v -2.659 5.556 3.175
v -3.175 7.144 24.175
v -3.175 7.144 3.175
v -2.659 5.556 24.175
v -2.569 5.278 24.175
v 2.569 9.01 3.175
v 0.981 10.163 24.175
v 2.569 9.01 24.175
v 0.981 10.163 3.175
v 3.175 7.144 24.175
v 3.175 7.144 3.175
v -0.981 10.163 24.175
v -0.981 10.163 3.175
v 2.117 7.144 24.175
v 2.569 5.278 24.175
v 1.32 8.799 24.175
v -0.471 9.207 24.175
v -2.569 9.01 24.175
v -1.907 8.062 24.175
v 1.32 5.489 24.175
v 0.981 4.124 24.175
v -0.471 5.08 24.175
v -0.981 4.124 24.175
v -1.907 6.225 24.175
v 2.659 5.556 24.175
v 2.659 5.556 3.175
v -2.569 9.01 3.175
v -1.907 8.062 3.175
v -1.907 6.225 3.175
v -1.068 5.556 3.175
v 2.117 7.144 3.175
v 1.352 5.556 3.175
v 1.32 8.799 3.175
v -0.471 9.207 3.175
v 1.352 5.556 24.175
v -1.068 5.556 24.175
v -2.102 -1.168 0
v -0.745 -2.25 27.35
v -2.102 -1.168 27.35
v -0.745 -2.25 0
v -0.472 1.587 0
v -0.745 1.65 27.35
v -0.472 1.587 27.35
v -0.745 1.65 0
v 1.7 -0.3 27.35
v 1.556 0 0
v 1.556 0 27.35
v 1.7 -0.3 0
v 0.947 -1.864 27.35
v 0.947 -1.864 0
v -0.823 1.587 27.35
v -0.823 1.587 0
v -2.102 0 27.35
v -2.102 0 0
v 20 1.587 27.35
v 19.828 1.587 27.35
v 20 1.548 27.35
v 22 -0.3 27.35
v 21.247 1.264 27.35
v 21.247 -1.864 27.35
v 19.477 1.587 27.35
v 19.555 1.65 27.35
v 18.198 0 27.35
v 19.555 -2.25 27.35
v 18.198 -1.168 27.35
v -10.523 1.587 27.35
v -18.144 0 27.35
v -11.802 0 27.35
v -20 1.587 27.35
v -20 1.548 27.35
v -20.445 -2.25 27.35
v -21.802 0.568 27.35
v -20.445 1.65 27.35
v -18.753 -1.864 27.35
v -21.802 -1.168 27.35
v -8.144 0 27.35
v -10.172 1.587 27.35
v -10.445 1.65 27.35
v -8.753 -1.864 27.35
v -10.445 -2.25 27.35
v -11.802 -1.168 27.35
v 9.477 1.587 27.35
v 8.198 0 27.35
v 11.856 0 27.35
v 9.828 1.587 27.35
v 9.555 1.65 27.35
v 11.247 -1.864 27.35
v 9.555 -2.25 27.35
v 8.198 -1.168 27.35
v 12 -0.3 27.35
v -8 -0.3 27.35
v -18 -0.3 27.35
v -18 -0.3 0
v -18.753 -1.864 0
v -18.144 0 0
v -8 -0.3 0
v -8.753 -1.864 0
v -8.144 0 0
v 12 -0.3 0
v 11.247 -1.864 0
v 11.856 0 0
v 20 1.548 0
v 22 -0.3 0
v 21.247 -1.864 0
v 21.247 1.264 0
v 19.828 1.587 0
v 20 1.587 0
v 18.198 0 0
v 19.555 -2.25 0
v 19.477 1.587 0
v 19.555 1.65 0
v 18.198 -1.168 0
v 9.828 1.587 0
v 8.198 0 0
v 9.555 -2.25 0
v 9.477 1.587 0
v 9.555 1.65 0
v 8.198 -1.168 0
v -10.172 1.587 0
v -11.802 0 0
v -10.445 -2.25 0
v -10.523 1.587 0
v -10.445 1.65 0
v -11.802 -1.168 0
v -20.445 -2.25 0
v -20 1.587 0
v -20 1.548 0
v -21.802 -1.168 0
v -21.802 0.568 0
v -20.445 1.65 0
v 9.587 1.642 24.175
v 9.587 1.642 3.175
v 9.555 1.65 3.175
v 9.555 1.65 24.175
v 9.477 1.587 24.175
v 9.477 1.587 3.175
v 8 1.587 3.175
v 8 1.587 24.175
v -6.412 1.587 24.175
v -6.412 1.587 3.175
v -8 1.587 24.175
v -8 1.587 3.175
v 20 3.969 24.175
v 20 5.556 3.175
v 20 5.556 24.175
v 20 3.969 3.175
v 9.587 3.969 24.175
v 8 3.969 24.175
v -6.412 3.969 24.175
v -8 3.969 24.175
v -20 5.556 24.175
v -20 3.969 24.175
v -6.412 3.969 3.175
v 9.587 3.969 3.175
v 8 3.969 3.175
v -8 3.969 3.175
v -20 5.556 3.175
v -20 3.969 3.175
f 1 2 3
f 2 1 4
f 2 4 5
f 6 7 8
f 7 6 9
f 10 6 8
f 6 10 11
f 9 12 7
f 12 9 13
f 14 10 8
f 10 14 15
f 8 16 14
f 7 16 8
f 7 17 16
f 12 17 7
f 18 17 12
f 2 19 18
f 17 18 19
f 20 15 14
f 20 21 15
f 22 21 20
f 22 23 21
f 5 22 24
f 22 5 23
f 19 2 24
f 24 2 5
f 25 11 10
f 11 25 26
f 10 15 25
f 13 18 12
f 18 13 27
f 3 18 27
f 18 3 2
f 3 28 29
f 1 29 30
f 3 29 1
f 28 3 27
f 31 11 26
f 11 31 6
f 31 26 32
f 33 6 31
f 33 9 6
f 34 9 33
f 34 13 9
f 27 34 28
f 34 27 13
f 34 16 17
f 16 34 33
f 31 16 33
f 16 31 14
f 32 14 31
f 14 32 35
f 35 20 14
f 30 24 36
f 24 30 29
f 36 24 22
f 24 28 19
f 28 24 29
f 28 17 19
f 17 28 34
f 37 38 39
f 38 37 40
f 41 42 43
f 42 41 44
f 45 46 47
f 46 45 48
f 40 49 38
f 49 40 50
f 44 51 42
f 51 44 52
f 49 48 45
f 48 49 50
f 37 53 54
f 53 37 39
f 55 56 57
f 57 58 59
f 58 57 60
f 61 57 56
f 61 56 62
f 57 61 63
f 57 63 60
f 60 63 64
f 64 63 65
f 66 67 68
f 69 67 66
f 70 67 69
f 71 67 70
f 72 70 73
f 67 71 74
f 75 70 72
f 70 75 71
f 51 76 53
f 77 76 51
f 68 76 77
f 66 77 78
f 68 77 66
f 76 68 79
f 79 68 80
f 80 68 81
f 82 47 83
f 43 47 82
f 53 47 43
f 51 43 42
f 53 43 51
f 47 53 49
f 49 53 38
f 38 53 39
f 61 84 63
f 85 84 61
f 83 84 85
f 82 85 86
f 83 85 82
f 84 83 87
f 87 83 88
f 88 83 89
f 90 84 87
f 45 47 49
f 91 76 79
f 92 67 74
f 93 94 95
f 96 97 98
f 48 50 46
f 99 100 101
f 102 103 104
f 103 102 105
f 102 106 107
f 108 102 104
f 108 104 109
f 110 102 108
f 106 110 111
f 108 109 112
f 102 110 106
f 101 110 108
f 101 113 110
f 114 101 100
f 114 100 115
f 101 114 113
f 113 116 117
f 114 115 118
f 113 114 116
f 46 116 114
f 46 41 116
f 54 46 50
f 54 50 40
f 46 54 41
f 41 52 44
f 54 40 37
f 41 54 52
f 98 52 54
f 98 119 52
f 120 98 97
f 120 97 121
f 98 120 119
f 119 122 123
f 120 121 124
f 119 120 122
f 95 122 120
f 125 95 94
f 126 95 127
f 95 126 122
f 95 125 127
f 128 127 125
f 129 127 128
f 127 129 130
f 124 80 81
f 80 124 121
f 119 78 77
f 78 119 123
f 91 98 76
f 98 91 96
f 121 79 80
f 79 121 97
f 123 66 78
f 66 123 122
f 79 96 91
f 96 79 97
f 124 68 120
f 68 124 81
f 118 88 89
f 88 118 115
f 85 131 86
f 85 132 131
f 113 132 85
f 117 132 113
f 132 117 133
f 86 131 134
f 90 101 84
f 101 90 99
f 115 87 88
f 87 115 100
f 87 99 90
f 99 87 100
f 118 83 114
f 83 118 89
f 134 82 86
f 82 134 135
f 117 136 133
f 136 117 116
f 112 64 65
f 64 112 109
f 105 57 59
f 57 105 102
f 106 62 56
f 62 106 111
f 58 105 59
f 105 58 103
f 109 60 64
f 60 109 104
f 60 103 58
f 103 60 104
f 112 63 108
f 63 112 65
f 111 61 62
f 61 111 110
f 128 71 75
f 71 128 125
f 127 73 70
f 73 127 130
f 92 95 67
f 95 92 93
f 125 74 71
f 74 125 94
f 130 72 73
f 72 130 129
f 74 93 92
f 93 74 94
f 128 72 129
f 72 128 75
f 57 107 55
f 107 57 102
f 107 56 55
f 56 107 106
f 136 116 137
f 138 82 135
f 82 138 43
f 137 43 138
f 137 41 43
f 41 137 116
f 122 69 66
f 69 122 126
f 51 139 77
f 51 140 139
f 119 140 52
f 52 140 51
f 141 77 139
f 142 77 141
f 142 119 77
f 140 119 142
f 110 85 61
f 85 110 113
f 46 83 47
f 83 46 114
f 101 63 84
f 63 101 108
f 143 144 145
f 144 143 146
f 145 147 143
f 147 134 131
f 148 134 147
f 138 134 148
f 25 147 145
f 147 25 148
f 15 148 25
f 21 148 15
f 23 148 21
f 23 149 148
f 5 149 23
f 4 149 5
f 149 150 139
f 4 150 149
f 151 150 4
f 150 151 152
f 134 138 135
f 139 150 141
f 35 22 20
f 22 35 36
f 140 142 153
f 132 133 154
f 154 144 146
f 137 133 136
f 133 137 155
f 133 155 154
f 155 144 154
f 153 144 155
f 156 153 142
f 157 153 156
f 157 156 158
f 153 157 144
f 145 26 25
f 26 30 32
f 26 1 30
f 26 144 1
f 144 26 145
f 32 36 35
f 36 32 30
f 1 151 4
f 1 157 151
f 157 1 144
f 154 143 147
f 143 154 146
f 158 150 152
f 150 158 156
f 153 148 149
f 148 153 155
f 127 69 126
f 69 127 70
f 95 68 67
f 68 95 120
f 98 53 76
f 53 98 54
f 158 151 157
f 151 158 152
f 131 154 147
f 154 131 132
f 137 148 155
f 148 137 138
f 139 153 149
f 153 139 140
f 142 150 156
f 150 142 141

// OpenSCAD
// file: v2/splice.scad
/**
 * t-splice.scad is part of Paper Laptop project.
 *
 * @author R. S. Doiel, <rsdoiel@gmail.com>
 * copyright (c) 2016 all rights reserved
 * Released under a BSD 2-clause license
 */

/*
# misc notes

|  Inches   | Inches    |  Millimeters |
|(fraction) | (decimal) |              |
+-----------+-----------+--------------+
|    1/16   |    0.0625 | 1.5875       |
|    1/8    |    0.125  | 3.175        |
|    3/16   |    0.1875 | 4.7625       |
|    1/4    |    0.25   | 6.35         |
|    3/8    |    0.375  | 9.525        |
|    1/2    |    0.5    | 12.7         |
|    5/8    |    0.625  | 15.875       |
|    3/4    |    0.75   | 19.05        |
|    7/8    |    0.875  | 22.225       |
|    1      |    1.0    | 25.4         |

## Raspberry Pi Dimensions

85.60mm x 56mm x 21mm
(or roughly 3.37″ x 2.21″ x 0.83″)

 */

 /*
  * Splice: basic splice, units assumed is 1mm
  */
module Splice() {
    // sizing and spacing
    t = 3.175;// Aprox. 1/8 inch.
    side_t = t/2;
    side_l = 20;
    b_spacing = side_l/2;
    inner_h = 21;
    inner_t = t*1.25;
    outer_t = side_t;
    outer_h = inner_h+(2*t);
    bump_r = 2;
    bump_o = -0.3;

    // main fastening surface
    translate([0, t*2.25, t]) {
        difference() {
            // fastener body
            color([1,0,0]) cylinder(h=inner_h, r=t, center=false);
            // bolt hole
            color([0,0,0]) cylinder(h=inner_h, r=t/1.5, center=false);
        }
    }

    // corner bumper
    translate([bump_o, bump_o, 0]) {
        color([1,0,0]) cylinder(h=outer_h, r=bump_r, center=false);
    }

    // middle bumpers side a
    translate([b_spacing * -1, bump_o,0]) {
        color([1,0,0]) cylinder(h=outer_h, r=bump_r, center=false);
    }

    // middle bumpers side b
    translate([b_spacing, bump_o, 0]) {
        color([1,0,0]) cylinder(h=outer_h, r=bump_r, center=false);
    }

    // end bumpers
    translate([side_l, bump_o, 0]) {
        color([1,0,0]) cylinder(h=outer_h, r=bump_r, center=false);
    }
    translate([side_l*-1, bump_o, 0]) {
        color([1,0,0]) cylinder(h=outer_h, r=bump_r, center=false);
    }

    // outer side a
    translate([0, 0, 0]) {
       color([0,1,0]) cube([side_l, side_t, outer_h], center=false);
    }

    // Inner side a
    translate([0, t*1.25, t]) {
       color([0,1,0]) cube([side_l, side_t, inner_h], center=false);
    }

    // outer side b
    translate([-1 * side_l, 0, 0]) {
       color([1,1,0]) cube([side_l, side_t, outer_h], center=false);
    }

    // Inner side b
    translate([side_l*-1, t*1.25, t]) {
       color([1,1,0]) cube([side_l, side_t, inner_h], center=false);
    }

    // filler corner
    translate([8, 1, t]) {
       color([0,0, 1]) cube([outer_t, inner_t, inner_h], center=false);
    }
    translate([-8, 1, t]) {
       color([0,0, 1]) cube([outer_t, inner_t, inner_h], center=false);
    }
}

/*
 * SpliceT: A T shaped splice, units assumed is 1mm
 */
module SpliceT() {
   // sizing and spacing
   t = 3.175;// Aprox. 1/8 inch.
   side_t = t/2;
   side_l = 20;
   b_spacing = side_l/2;
   inner_h = 21;
   inner_t = t*1.25;
   outer_t = side_t;
   outer_h = inner_h+(2*t);
   bump_r = 2;
   bump_o = -0.3;

   // main fastening surface
   translate([0, t*2.25, t]) {
       difference() {
           // fastener body
           color([1,0,1]) cylinder(h=inner_h, r=t, center=false);
           // bolt hole
           color([0,0,0]) cylinder(h=inner_h, r=t/1.5, center=false);
       }
   }

   // corner bumper
   translate([bump_o, bump_o, 0]) {
       color([1,0,0]) cylinder(h=outer_h, r=bump_r, center=false);
   }

   // middle bumpers side a
   translate([b_spacing * -1, bump_o,0]) {
       color([1,0,0]) cylinder(h=outer_h, r=bump_r, center=false);
   }

   // middle bumpers side b
   translate([b_spacing, bump_o, 0]) {
       color([1,0,0]) cylinder(h=outer_h, r=bump_r, center=false);
   }

   // end bumpers
   translate([side_l, bump_o, 0]) {
       color([1,0,0]) cylinder(h=outer_h, r=bump_r, center=false);
   }
   translate([side_l*-1, bump_o, 0]) {
       color([1,0,0]) cylinder(h=outer_h, r=bump_r, center=false);
   }

   // outer side a
   translate([0, 0, 0]) {
      color([0,1,0]) cube([side_l, side_t, outer_h], center=false);
   }

   // inner side a
   translate([0, t*1.25, t]) {
      color([0,1,0]) cube([side_l, side_t, inner_h], center=false);
   }

   // outer side b
   translate([-1 * side_l, 0, 0]) {
      color([1,1,0]) cube([side_l, side_t, outer_h], center=false);
   }

   // inner side b
   translate([side_l*-1, t*1.25, t]) {
      color([1,1,0]) cube([side_l, side_t, inner_h], center=false);
   }

   // port side c
   translate([t*-1, 0, t]) {
      color([0,1,1]) cube([side_t, side_l, inner_h], center=false);
   }

   // starboard side c
   translate([t/2, 0, t]) {
      color([0,1,1]) cube([side_t, side_l, inner_h], center=false);
   }

   // filler corner
   translate([2*t, 1, t]) {
      color([0,0, 1]) cube([outer_t, inner_t, inner_h], center=false);
   }
   translate([-2.5*t, 1, t]) {
      color([0,0, 1]) cube([outer_t, inner_t, inner_h], center=false);
   }
}
// main file
/**
 * test-splice.scad is part of Paper Laptop project.
 *
 * @author R. S. Doiel, <rsdoiel@gmail.com>
 * copyright (c) 2016 all rights reserved
 * Released under a BSD 2-clause license
 */
include <v2/splice.scad>

Splice();
